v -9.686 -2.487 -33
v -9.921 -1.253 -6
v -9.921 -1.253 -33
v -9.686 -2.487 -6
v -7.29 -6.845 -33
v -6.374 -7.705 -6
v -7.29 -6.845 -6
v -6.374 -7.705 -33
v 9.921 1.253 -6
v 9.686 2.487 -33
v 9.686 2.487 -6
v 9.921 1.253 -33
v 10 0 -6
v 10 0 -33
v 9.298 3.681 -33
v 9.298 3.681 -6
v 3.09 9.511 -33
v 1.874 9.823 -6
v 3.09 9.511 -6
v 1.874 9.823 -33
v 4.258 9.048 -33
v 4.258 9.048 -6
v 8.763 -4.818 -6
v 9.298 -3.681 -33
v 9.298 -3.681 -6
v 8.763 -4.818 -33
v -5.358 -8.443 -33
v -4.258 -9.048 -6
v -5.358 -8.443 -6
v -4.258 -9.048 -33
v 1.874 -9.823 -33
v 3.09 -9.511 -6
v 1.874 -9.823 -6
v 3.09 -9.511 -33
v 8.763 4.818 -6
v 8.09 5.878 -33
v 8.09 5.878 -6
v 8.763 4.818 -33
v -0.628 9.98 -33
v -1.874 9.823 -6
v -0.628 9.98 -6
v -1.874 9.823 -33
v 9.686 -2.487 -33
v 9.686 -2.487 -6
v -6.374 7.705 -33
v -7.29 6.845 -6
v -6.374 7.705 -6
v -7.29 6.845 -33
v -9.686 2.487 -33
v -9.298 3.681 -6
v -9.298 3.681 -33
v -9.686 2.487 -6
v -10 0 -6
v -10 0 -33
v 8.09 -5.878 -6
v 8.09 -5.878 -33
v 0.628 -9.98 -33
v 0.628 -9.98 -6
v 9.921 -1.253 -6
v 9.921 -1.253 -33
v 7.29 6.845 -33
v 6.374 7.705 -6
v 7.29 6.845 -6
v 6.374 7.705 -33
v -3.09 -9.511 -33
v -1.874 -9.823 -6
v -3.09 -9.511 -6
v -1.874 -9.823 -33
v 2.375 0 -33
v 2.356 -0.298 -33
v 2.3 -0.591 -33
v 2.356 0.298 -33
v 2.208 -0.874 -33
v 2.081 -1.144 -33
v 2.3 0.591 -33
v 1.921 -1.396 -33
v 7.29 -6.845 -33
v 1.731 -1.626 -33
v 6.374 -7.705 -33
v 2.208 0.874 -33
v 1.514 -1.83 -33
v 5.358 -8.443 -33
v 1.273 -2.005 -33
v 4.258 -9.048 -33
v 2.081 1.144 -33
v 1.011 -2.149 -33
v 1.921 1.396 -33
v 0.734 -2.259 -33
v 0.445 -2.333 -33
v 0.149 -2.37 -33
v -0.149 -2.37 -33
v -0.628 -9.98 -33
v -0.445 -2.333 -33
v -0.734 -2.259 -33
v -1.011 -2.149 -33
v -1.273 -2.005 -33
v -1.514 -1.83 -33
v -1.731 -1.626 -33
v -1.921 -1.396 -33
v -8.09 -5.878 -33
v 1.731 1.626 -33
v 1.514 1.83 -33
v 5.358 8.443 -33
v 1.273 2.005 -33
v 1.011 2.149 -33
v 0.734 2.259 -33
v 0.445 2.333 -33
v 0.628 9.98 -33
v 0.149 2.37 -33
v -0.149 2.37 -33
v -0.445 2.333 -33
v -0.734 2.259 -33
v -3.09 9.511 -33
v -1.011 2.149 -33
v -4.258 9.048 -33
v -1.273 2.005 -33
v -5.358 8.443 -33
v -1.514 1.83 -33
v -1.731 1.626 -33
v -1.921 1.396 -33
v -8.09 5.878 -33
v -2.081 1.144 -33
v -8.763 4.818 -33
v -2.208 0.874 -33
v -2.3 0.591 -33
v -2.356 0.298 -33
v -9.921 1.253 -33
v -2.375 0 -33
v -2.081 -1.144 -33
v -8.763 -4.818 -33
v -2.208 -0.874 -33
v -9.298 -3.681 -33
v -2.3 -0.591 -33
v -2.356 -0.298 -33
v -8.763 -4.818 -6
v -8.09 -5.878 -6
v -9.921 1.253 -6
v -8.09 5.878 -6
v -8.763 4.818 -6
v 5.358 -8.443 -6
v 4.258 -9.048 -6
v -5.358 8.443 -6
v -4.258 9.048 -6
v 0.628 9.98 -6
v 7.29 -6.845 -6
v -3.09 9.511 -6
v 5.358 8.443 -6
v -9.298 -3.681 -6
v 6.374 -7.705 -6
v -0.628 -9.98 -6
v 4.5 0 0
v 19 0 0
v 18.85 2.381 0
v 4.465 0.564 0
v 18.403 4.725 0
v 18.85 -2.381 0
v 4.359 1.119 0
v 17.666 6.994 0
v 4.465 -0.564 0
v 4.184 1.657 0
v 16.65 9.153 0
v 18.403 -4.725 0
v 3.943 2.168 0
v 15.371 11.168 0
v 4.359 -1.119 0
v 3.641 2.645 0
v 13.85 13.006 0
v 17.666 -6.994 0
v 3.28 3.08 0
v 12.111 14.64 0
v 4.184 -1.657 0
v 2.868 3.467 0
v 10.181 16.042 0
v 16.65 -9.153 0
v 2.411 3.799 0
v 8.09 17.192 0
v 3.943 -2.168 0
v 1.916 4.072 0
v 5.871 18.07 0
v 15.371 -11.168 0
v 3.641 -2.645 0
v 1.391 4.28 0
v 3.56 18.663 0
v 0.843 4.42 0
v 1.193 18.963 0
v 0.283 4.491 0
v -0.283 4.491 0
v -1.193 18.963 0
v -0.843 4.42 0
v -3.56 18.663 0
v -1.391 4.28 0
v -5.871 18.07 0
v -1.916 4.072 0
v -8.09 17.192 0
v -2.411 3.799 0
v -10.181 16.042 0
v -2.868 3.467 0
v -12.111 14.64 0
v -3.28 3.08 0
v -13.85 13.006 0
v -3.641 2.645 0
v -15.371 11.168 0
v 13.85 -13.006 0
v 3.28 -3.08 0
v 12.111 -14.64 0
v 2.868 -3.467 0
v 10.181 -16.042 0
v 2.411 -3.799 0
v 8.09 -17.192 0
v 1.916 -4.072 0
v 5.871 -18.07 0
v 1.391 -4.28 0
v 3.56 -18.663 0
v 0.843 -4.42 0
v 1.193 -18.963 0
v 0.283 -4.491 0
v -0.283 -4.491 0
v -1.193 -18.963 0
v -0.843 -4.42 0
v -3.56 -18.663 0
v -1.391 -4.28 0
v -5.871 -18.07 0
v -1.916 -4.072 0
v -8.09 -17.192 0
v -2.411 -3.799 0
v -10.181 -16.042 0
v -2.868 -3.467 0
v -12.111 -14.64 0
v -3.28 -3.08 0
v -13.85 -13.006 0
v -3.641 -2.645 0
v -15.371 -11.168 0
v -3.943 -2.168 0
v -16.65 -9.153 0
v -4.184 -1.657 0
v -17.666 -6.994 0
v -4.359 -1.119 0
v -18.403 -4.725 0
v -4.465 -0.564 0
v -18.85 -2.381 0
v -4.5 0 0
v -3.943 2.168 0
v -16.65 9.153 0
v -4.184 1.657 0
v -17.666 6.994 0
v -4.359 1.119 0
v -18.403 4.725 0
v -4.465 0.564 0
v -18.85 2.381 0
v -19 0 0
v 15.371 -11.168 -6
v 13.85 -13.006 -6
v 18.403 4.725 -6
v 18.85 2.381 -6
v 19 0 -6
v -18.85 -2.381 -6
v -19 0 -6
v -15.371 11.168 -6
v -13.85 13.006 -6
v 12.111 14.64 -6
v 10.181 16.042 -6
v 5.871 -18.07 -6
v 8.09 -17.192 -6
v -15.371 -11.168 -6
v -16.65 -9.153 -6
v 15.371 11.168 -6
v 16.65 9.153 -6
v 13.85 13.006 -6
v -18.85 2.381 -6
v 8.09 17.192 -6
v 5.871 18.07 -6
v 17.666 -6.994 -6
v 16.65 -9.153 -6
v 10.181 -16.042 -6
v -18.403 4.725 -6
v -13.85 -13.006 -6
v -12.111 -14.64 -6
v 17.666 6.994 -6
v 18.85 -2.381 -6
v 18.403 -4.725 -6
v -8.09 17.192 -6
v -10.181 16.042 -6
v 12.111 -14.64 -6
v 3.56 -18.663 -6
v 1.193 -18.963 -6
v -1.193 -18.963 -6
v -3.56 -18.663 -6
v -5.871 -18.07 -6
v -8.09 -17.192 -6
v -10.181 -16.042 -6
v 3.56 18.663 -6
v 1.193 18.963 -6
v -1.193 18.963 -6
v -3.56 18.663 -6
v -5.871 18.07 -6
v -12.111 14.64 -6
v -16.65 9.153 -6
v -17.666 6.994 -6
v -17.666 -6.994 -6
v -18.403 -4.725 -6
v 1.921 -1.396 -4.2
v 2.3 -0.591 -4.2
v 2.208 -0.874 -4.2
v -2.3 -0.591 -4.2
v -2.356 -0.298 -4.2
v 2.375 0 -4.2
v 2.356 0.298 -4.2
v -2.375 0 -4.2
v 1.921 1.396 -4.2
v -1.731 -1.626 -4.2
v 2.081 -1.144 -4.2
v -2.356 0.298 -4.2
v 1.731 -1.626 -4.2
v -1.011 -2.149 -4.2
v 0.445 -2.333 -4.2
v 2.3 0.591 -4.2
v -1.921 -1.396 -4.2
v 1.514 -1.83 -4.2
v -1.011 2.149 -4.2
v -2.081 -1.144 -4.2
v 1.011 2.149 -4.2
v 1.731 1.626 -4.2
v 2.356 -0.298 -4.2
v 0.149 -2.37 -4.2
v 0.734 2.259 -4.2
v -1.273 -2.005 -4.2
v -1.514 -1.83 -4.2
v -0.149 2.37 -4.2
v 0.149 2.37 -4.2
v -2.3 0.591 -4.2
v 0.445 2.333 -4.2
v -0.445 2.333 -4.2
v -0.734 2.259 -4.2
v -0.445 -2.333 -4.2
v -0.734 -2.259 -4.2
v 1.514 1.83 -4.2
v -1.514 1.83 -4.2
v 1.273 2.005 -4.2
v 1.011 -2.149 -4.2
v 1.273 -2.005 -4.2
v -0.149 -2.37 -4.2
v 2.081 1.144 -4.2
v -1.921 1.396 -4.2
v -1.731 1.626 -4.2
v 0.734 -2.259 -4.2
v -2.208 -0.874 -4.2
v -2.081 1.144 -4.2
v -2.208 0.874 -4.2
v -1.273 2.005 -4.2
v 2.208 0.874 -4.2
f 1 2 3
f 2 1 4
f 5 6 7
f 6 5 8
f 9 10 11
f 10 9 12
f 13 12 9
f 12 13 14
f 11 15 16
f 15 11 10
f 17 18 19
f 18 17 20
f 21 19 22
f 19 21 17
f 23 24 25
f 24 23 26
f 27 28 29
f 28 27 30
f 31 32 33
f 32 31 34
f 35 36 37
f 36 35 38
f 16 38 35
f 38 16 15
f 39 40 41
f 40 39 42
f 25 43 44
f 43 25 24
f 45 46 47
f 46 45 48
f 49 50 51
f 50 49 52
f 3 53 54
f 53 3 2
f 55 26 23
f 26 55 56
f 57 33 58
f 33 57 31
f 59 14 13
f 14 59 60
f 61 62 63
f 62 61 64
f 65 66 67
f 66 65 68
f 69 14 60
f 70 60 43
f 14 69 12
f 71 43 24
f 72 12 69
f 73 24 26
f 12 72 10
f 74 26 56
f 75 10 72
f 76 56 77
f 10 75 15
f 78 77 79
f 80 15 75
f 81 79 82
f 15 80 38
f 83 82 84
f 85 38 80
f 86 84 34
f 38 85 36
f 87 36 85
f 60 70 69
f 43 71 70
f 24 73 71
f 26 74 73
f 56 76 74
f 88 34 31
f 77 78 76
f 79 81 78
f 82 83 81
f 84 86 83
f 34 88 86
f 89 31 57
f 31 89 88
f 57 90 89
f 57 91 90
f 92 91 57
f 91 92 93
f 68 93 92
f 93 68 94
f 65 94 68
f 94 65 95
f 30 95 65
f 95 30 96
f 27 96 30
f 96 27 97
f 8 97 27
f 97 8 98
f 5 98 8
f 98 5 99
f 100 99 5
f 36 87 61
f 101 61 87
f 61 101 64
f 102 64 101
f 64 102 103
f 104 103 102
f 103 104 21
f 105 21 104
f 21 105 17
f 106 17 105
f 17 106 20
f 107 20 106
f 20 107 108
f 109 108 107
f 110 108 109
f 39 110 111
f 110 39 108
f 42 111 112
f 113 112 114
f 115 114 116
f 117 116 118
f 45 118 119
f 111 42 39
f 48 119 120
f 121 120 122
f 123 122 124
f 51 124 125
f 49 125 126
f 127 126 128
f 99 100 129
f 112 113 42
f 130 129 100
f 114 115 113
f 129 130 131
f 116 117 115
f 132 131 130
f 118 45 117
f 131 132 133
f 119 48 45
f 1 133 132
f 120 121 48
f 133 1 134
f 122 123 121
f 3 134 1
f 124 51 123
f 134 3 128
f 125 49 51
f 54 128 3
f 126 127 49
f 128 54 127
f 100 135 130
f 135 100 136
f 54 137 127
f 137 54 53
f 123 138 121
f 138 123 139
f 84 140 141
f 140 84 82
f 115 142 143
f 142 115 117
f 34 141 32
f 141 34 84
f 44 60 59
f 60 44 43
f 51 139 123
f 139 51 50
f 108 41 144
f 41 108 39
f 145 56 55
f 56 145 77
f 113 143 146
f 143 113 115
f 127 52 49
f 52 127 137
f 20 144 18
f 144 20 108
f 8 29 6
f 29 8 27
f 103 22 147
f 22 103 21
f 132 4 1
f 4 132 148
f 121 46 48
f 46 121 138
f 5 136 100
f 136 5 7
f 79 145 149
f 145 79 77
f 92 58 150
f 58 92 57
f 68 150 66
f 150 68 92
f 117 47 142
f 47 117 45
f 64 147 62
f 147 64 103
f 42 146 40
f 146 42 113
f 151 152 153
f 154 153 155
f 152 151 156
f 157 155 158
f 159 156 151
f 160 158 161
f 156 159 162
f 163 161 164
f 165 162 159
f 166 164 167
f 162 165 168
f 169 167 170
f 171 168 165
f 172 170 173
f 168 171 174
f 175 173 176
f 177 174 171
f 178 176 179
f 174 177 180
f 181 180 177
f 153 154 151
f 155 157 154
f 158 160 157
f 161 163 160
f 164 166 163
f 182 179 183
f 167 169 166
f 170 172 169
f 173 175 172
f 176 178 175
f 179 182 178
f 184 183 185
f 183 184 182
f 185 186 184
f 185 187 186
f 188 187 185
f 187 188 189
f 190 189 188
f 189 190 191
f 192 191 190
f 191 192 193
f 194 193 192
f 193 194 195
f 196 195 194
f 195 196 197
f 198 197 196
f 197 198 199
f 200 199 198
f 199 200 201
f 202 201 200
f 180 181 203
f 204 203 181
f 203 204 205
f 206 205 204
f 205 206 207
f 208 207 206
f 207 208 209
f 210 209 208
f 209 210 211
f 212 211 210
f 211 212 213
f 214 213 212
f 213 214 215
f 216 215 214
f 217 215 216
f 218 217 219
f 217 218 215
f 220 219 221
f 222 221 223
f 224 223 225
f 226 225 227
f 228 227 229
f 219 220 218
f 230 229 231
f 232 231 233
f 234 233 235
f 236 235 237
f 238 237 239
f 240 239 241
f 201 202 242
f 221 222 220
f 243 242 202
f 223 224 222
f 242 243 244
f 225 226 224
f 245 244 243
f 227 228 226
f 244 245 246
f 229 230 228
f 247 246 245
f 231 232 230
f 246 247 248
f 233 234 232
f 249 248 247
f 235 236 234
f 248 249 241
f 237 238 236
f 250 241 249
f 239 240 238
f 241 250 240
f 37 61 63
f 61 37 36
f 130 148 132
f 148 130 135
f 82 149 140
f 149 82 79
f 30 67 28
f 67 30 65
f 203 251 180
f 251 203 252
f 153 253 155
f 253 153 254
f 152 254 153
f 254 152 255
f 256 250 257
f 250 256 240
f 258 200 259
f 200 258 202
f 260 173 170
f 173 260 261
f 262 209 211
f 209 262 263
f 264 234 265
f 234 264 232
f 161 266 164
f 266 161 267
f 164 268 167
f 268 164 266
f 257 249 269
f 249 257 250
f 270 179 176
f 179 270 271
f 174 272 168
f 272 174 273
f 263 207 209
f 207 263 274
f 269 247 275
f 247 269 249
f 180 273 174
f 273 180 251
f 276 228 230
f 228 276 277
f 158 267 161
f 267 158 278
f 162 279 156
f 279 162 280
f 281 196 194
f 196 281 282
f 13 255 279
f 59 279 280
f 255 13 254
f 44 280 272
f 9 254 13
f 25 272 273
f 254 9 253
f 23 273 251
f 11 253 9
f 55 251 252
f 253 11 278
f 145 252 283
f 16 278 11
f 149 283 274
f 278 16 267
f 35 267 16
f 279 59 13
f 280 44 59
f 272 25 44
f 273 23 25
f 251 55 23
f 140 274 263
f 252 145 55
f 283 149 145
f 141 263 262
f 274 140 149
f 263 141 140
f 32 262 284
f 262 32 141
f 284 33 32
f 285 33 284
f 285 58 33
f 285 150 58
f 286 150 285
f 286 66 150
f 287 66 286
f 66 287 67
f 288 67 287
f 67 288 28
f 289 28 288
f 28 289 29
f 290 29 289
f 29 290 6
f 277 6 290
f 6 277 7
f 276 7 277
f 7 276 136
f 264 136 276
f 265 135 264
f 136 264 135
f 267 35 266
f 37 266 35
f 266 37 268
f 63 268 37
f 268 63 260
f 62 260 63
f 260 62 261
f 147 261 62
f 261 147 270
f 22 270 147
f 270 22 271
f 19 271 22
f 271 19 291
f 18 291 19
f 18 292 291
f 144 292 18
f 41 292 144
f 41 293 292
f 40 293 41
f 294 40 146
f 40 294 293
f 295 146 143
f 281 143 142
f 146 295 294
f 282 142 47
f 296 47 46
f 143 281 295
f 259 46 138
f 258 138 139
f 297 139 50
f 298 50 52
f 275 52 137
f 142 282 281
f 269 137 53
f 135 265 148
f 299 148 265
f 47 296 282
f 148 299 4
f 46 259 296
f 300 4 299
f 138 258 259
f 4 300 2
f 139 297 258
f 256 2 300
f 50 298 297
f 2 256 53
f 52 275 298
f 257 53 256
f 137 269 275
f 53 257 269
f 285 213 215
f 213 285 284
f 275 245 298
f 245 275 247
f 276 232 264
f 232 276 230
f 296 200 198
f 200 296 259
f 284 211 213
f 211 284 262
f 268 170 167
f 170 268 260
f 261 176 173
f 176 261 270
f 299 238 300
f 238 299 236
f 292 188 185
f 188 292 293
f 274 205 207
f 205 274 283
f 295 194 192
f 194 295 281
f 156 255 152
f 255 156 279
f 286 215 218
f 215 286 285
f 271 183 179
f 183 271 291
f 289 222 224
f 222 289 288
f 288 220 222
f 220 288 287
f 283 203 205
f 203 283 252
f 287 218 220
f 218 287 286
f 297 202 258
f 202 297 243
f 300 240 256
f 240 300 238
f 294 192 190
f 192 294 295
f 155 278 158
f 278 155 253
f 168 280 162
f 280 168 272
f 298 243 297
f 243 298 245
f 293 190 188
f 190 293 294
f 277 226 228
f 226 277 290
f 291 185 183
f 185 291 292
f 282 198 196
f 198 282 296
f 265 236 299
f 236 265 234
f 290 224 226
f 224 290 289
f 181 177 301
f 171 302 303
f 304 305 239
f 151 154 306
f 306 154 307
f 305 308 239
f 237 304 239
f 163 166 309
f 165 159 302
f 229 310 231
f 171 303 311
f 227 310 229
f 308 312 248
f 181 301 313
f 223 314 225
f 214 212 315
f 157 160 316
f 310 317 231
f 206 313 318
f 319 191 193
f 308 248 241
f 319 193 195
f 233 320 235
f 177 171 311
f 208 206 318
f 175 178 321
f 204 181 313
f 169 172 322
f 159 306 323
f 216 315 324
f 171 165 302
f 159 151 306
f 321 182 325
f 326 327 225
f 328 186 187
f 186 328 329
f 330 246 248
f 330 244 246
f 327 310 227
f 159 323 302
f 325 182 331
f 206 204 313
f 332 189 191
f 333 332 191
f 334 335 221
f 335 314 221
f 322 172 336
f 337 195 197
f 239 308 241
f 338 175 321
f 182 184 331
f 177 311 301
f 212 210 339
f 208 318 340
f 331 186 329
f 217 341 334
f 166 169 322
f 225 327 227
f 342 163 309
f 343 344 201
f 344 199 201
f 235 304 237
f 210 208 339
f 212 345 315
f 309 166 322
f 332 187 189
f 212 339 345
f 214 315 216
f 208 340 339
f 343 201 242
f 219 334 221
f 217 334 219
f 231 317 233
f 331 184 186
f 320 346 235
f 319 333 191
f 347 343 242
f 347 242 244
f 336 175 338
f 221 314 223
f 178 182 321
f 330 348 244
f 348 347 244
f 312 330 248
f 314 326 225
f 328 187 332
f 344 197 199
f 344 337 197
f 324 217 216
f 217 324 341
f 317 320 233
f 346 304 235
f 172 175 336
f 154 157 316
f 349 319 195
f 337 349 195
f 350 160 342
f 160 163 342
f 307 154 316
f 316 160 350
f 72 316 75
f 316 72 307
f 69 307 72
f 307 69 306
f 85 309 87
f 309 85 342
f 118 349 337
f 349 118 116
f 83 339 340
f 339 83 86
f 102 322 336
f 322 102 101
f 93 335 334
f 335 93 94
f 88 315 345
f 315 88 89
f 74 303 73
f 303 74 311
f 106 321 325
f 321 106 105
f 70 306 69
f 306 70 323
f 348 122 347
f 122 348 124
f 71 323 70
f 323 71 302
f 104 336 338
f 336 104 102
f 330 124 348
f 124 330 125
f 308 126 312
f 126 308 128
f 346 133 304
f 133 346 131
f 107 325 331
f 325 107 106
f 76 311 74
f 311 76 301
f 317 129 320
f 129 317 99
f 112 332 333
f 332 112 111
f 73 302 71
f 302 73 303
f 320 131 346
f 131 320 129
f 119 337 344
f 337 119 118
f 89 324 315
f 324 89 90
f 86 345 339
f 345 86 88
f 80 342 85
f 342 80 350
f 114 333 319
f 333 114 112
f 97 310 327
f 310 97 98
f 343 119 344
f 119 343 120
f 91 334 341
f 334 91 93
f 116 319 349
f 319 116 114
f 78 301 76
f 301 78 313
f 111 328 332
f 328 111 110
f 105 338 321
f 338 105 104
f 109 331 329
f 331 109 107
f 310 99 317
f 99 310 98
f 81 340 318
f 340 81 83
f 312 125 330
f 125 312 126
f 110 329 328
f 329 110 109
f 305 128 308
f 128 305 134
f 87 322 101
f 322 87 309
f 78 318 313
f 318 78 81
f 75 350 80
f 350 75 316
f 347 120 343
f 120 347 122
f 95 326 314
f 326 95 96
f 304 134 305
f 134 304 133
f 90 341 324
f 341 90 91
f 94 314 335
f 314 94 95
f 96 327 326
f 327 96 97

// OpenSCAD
$fn = 50;


difference() {
	union() {
		translate(v = [0, 0, -33.0000000000]) {
			cylinder(h = 33, r = 10.0000000000);
		}
		translate(v = [0, 0, -6.0000000000]) {
			cylinder(h = 6, r = 19.0000000000);
		}
	}
	union() {
		translate(v = [0, 0, 0]) {
			rotate(a = [0, 0, 0]) {
				difference() {
					union() {
						#translate(v = [0, 0, -33.0000000000]) {
							cylinder(h = 33, r = 2.2500000000);
						}
						#translate(v = [0, 0, -4.2000000000]) {
							cylinder(h = 4.2000000000, r = 10.0000000000, r1 = 2.3750000000, r2 = 4.5000000000);
						}
						#translate(v = [0, 0, -33.0000000000]) {
							cylinder(h = 33, r = 2.3750000000);
						}
						#translate(v = [0, 0, -33.0000000000]) {
							cylinder(h = 33, r = 2.2500000000);
						}
					}
					union();
				}
			}
		}
	}
}
